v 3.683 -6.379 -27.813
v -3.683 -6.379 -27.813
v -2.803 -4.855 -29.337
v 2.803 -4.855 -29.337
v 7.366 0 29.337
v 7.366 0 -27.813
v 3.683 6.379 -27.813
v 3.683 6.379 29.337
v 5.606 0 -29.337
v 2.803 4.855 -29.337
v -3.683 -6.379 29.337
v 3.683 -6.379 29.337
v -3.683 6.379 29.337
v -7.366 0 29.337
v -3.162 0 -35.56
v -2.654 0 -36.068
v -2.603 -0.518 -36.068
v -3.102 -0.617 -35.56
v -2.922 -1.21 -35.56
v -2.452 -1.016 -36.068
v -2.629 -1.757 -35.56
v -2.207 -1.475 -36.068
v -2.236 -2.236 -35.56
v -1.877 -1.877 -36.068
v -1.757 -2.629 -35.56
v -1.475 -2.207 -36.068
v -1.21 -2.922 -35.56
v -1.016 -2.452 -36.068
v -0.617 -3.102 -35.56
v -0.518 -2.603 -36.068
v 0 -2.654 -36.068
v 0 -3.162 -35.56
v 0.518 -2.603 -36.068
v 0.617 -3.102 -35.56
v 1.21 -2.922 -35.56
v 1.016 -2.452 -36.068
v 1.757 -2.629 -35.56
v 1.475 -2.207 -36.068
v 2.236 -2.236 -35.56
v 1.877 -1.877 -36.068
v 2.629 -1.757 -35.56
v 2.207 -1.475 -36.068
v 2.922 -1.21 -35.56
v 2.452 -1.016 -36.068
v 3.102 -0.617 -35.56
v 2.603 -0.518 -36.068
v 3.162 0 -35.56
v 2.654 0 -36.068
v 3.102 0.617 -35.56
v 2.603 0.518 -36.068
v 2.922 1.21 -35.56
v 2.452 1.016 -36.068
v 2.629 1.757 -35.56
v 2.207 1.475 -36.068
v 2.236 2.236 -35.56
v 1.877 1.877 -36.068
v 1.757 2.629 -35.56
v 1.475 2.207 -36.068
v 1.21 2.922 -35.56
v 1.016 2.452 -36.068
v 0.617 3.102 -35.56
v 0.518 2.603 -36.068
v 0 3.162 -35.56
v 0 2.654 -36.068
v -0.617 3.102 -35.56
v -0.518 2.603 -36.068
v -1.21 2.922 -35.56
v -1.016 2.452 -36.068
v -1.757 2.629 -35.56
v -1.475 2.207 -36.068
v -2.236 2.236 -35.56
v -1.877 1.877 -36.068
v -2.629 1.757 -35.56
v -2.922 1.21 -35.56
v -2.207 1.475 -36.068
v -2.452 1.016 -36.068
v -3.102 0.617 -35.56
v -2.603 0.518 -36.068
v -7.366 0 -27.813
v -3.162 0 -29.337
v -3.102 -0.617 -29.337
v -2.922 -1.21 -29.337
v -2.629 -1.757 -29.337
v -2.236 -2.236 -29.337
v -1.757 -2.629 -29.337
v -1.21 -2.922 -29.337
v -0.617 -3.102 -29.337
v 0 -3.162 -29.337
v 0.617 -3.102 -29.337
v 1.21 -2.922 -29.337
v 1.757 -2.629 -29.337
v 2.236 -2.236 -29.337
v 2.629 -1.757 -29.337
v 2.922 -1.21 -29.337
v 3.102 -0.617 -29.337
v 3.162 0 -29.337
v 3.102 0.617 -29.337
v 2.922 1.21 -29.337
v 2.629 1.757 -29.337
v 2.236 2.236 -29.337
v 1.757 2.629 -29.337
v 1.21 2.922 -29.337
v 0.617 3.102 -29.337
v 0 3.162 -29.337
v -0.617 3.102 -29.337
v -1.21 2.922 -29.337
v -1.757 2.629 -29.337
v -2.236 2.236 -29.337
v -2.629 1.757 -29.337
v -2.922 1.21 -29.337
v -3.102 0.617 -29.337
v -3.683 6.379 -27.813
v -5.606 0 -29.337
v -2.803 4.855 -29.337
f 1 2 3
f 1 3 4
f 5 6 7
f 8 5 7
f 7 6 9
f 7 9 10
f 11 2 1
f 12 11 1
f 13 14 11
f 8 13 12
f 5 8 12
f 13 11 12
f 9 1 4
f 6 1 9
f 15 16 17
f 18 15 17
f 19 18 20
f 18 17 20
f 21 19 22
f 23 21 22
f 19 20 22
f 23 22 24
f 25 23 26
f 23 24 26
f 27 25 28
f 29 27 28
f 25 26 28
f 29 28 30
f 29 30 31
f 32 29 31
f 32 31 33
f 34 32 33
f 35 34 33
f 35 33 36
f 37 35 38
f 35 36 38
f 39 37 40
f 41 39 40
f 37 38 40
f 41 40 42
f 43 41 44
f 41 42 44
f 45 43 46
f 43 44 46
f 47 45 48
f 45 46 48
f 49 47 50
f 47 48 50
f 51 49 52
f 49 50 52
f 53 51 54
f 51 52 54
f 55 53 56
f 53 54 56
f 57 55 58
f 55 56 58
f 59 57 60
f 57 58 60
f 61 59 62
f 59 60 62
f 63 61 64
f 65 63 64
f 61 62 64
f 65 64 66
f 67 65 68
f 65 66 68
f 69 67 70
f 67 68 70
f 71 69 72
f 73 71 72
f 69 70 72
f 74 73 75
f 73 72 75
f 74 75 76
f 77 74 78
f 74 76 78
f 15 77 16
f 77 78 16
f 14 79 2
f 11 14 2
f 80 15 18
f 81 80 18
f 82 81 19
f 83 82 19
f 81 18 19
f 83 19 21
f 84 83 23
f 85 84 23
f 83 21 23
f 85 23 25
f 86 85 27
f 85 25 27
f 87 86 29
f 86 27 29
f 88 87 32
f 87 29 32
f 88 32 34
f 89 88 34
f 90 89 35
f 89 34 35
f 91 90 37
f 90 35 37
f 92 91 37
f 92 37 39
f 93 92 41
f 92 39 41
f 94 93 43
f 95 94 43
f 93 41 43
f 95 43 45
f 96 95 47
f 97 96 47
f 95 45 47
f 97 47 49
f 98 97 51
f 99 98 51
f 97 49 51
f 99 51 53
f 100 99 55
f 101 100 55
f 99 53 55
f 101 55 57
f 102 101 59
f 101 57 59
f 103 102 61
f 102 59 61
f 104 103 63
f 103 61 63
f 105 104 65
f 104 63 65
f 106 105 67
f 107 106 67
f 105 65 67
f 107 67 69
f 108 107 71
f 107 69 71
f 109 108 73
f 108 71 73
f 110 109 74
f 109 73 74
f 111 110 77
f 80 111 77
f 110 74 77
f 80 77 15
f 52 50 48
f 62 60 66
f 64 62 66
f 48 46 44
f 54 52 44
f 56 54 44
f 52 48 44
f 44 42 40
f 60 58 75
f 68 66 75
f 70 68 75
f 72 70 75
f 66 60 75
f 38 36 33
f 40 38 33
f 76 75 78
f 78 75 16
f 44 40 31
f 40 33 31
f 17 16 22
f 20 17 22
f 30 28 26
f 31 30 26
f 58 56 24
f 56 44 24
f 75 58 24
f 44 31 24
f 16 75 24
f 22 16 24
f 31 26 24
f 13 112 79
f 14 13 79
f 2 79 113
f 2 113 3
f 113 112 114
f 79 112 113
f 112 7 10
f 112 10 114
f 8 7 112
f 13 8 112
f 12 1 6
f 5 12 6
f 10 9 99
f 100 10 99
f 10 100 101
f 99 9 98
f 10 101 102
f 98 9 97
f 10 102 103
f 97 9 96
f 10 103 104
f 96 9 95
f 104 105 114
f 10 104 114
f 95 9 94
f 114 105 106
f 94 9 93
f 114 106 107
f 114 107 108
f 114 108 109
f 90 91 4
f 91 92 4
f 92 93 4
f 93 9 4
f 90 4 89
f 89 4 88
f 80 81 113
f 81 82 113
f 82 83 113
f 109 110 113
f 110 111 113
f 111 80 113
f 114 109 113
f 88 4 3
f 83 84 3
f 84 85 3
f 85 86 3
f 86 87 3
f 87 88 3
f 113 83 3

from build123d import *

# Parameters (mm, degrees)
CHAMFER1_SIZE  = 0.50801365
EXTRUDE1_REACH = 60.674
CHAMFER2_SIZE  = 1.524


with BuildPart() as part:
    # Sketch1 → Revolve1 (revolve)
    with BuildSketch(Plane(origin=(0, 0, 0), x_dir=(1, 0, 0), z_dir=(0, 1, 0)), mode=Mode.PRIVATE) as revolve1_sk:
        Polygon((7.366, -29.337), (7.366, 29.337), (3.1623, 29.337), (3.1623, 36.068), (0, 36.068), (0, -29.337), align=None)
    revolve(revolve1_sk.sketch.rotate(Axis((0, 0, -36.068), (0, 0, 1)), 180), axis=Axis((0, 0, -36.068), (0, 0, 1)))  # turned: the seam where the file's is

    # Chamfer1
    chamfer1_edges = [part.edges().sort_by_distance(p)[0] for p in [
        (3.1623, 0, -36.068),
    ]]
    chamfer(chamfer1_edges, length=CHAMFER1_SIZE)

    # Sketch2 → Extrude1 (cut, up to next)
    with BuildSketch(Plane(origin=(0, 0, -29.337), x_dir=(-1, 0, 0), z_dir=(0, 0, -1)), mode=Mode.PRIVATE) as extrude1_sk1:
        with BuildLine():
            ThreePointArc((3.683, 6.379143124), (0, 7.366), (-3.683, 6.379143124))
            Line((-3.683, 6.379143124), (3.683, 6.379143124))
        make_face()
    extrude1_tool1 = extrude(extrude1_sk1.sketch, amount=-EXTRUDE1_REACH, mode=Mode.PRIVATE) & part.part
    add(extrude1_tool1.solids().sort_by_distance((0, 6.776244, -29.337))[0], mode=Mode.SUBTRACT)
    # Sketch2 → Extrude1 (cut, up to next)
    with BuildSketch(Plane(origin=(0, 0, -29.337), x_dir=(-1, 0, 0), z_dir=(0, 0, -1)), mode=Mode.PRIVATE) as extrude1_sk2:
        with BuildLine():
            ThreePointArc((7.366, 0), (6.379143124, 3.683), (3.683, 6.379143124))
            Line((3.683, 6.379143124), (7.366, 0))
        make_face()
    extrude1_tool2 = extrude(extrude1_sk2.sketch, amount=-EXTRUDE1_REACH, mode=Mode.PRIVATE) & part.part
    add(extrude1_tool2.solids().sort_by_distance((-5.868399, 3.388122, -29.337))[0], mode=Mode.SUBTRACT)
    # Sketch2 → Extrude1 (cut, up to next)
    with BuildSketch(Plane(origin=(0, 0, -29.337), x_dir=(-1, 0, 0), z_dir=(0, 0, -1)), mode=Mode.PRIVATE) as extrude1_sk3:
        with BuildLine():
            Line((7.366, 0), (3.683, -6.379143124))
            ThreePointArc((3.683, -6.379143124), (6.379143124, -3.683), (7.366, 0))
        make_face()
    extrude1_tool3 = extrude(extrude1_sk3.sketch, amount=-EXTRUDE1_REACH, mode=Mode.PRIVATE) & part.part
    add(extrude1_tool3.solids().sort_by_distance((-5.868399, -3.388122, -29.337))[0], mode=Mode.SUBTRACT)
    # Sketch2 → Extrude1 (cut, up to next)
    with BuildSketch(Plane(origin=(0, 0, -29.337), x_dir=(-1, 0, 0), z_dir=(0, 0, -1)), mode=Mode.PRIVATE) as extrude1_sk4:
        with BuildLine():
            Line((3.683, -6.379143124), (-3.683, -6.379143124))
            ThreePointArc((-3.683, -6.379143124), (0, -7.366), (3.683, -6.379143124))
        make_face()
    extrude1_tool4 = extrude(extrude1_sk4.sketch, amount=-EXTRUDE1_REACH, mode=Mode.PRIVATE) & part.part
    add(extrude1_tool4.solids().sort_by_distance((0, -6.776244, -29.337))[0], mode=Mode.SUBTRACT)
    # Sketch2 → Extrude1 (cut, up to next)
    with BuildSketch(Plane(origin=(0, 0, -29.337), x_dir=(-1, 0, 0), z_dir=(0, 0, -1)), mode=Mode.PRIVATE) as extrude1_sk5:
        with BuildLine():
            Line((-3.683, -6.379143124), (-7.366, 0))
            ThreePointArc((-7.366, 0), (-6.379143124, -3.683), (-3.683, -6.379143124))
        make_face()
    extrude1_tool5 = extrude(extrude1_sk5.sketch, amount=-EXTRUDE1_REACH, mode=Mode.PRIVATE) & part.part
    add(extrude1_tool5.solids().sort_by_distance((5.868399, -3.388122, -29.337))[0], mode=Mode.SUBTRACT)
    # Sketch2 → Extrude1 (cut, up to next)
    with BuildSketch(Plane(origin=(0, 0, -29.337), x_dir=(-1, 0, 0), z_dir=(0, 0, -1)), mode=Mode.PRIVATE) as extrude1_sk6:
        with BuildLine():
            ThreePointArc((-3.683, 6.379143124), (-6.379143124, 3.683), (-7.366, 0))
            Line((-7.366, 0), (-3.683, 6.379143124))
        make_face()
    extrude1_tool6 = extrude(extrude1_sk6.sketch, amount=-EXTRUDE1_REACH, mode=Mode.PRIVATE) & part.part
    add(extrude1_tool6.solids().sort_by_distance((5.868399, 3.388122, -29.337))[0], mode=Mode.SUBTRACT)

    # Chamfer2
    chamfer2_edges = [part.edges().sort_by_distance(p)[0] for p in [
        (0, 6.379143124, -29.337),
        (-5.5245, 3.189571562, -29.337),
        (-5.5245, -3.189571562, -29.337),
        (0, -6.379143124, -29.337),
        (5.5245, -3.189571562, -29.337),
        (5.5245, 3.189571562, -29.337),
    ]]
    chamfer(chamfer2_edges, length=CHAMFER2_SIZE)


solid = part.part
